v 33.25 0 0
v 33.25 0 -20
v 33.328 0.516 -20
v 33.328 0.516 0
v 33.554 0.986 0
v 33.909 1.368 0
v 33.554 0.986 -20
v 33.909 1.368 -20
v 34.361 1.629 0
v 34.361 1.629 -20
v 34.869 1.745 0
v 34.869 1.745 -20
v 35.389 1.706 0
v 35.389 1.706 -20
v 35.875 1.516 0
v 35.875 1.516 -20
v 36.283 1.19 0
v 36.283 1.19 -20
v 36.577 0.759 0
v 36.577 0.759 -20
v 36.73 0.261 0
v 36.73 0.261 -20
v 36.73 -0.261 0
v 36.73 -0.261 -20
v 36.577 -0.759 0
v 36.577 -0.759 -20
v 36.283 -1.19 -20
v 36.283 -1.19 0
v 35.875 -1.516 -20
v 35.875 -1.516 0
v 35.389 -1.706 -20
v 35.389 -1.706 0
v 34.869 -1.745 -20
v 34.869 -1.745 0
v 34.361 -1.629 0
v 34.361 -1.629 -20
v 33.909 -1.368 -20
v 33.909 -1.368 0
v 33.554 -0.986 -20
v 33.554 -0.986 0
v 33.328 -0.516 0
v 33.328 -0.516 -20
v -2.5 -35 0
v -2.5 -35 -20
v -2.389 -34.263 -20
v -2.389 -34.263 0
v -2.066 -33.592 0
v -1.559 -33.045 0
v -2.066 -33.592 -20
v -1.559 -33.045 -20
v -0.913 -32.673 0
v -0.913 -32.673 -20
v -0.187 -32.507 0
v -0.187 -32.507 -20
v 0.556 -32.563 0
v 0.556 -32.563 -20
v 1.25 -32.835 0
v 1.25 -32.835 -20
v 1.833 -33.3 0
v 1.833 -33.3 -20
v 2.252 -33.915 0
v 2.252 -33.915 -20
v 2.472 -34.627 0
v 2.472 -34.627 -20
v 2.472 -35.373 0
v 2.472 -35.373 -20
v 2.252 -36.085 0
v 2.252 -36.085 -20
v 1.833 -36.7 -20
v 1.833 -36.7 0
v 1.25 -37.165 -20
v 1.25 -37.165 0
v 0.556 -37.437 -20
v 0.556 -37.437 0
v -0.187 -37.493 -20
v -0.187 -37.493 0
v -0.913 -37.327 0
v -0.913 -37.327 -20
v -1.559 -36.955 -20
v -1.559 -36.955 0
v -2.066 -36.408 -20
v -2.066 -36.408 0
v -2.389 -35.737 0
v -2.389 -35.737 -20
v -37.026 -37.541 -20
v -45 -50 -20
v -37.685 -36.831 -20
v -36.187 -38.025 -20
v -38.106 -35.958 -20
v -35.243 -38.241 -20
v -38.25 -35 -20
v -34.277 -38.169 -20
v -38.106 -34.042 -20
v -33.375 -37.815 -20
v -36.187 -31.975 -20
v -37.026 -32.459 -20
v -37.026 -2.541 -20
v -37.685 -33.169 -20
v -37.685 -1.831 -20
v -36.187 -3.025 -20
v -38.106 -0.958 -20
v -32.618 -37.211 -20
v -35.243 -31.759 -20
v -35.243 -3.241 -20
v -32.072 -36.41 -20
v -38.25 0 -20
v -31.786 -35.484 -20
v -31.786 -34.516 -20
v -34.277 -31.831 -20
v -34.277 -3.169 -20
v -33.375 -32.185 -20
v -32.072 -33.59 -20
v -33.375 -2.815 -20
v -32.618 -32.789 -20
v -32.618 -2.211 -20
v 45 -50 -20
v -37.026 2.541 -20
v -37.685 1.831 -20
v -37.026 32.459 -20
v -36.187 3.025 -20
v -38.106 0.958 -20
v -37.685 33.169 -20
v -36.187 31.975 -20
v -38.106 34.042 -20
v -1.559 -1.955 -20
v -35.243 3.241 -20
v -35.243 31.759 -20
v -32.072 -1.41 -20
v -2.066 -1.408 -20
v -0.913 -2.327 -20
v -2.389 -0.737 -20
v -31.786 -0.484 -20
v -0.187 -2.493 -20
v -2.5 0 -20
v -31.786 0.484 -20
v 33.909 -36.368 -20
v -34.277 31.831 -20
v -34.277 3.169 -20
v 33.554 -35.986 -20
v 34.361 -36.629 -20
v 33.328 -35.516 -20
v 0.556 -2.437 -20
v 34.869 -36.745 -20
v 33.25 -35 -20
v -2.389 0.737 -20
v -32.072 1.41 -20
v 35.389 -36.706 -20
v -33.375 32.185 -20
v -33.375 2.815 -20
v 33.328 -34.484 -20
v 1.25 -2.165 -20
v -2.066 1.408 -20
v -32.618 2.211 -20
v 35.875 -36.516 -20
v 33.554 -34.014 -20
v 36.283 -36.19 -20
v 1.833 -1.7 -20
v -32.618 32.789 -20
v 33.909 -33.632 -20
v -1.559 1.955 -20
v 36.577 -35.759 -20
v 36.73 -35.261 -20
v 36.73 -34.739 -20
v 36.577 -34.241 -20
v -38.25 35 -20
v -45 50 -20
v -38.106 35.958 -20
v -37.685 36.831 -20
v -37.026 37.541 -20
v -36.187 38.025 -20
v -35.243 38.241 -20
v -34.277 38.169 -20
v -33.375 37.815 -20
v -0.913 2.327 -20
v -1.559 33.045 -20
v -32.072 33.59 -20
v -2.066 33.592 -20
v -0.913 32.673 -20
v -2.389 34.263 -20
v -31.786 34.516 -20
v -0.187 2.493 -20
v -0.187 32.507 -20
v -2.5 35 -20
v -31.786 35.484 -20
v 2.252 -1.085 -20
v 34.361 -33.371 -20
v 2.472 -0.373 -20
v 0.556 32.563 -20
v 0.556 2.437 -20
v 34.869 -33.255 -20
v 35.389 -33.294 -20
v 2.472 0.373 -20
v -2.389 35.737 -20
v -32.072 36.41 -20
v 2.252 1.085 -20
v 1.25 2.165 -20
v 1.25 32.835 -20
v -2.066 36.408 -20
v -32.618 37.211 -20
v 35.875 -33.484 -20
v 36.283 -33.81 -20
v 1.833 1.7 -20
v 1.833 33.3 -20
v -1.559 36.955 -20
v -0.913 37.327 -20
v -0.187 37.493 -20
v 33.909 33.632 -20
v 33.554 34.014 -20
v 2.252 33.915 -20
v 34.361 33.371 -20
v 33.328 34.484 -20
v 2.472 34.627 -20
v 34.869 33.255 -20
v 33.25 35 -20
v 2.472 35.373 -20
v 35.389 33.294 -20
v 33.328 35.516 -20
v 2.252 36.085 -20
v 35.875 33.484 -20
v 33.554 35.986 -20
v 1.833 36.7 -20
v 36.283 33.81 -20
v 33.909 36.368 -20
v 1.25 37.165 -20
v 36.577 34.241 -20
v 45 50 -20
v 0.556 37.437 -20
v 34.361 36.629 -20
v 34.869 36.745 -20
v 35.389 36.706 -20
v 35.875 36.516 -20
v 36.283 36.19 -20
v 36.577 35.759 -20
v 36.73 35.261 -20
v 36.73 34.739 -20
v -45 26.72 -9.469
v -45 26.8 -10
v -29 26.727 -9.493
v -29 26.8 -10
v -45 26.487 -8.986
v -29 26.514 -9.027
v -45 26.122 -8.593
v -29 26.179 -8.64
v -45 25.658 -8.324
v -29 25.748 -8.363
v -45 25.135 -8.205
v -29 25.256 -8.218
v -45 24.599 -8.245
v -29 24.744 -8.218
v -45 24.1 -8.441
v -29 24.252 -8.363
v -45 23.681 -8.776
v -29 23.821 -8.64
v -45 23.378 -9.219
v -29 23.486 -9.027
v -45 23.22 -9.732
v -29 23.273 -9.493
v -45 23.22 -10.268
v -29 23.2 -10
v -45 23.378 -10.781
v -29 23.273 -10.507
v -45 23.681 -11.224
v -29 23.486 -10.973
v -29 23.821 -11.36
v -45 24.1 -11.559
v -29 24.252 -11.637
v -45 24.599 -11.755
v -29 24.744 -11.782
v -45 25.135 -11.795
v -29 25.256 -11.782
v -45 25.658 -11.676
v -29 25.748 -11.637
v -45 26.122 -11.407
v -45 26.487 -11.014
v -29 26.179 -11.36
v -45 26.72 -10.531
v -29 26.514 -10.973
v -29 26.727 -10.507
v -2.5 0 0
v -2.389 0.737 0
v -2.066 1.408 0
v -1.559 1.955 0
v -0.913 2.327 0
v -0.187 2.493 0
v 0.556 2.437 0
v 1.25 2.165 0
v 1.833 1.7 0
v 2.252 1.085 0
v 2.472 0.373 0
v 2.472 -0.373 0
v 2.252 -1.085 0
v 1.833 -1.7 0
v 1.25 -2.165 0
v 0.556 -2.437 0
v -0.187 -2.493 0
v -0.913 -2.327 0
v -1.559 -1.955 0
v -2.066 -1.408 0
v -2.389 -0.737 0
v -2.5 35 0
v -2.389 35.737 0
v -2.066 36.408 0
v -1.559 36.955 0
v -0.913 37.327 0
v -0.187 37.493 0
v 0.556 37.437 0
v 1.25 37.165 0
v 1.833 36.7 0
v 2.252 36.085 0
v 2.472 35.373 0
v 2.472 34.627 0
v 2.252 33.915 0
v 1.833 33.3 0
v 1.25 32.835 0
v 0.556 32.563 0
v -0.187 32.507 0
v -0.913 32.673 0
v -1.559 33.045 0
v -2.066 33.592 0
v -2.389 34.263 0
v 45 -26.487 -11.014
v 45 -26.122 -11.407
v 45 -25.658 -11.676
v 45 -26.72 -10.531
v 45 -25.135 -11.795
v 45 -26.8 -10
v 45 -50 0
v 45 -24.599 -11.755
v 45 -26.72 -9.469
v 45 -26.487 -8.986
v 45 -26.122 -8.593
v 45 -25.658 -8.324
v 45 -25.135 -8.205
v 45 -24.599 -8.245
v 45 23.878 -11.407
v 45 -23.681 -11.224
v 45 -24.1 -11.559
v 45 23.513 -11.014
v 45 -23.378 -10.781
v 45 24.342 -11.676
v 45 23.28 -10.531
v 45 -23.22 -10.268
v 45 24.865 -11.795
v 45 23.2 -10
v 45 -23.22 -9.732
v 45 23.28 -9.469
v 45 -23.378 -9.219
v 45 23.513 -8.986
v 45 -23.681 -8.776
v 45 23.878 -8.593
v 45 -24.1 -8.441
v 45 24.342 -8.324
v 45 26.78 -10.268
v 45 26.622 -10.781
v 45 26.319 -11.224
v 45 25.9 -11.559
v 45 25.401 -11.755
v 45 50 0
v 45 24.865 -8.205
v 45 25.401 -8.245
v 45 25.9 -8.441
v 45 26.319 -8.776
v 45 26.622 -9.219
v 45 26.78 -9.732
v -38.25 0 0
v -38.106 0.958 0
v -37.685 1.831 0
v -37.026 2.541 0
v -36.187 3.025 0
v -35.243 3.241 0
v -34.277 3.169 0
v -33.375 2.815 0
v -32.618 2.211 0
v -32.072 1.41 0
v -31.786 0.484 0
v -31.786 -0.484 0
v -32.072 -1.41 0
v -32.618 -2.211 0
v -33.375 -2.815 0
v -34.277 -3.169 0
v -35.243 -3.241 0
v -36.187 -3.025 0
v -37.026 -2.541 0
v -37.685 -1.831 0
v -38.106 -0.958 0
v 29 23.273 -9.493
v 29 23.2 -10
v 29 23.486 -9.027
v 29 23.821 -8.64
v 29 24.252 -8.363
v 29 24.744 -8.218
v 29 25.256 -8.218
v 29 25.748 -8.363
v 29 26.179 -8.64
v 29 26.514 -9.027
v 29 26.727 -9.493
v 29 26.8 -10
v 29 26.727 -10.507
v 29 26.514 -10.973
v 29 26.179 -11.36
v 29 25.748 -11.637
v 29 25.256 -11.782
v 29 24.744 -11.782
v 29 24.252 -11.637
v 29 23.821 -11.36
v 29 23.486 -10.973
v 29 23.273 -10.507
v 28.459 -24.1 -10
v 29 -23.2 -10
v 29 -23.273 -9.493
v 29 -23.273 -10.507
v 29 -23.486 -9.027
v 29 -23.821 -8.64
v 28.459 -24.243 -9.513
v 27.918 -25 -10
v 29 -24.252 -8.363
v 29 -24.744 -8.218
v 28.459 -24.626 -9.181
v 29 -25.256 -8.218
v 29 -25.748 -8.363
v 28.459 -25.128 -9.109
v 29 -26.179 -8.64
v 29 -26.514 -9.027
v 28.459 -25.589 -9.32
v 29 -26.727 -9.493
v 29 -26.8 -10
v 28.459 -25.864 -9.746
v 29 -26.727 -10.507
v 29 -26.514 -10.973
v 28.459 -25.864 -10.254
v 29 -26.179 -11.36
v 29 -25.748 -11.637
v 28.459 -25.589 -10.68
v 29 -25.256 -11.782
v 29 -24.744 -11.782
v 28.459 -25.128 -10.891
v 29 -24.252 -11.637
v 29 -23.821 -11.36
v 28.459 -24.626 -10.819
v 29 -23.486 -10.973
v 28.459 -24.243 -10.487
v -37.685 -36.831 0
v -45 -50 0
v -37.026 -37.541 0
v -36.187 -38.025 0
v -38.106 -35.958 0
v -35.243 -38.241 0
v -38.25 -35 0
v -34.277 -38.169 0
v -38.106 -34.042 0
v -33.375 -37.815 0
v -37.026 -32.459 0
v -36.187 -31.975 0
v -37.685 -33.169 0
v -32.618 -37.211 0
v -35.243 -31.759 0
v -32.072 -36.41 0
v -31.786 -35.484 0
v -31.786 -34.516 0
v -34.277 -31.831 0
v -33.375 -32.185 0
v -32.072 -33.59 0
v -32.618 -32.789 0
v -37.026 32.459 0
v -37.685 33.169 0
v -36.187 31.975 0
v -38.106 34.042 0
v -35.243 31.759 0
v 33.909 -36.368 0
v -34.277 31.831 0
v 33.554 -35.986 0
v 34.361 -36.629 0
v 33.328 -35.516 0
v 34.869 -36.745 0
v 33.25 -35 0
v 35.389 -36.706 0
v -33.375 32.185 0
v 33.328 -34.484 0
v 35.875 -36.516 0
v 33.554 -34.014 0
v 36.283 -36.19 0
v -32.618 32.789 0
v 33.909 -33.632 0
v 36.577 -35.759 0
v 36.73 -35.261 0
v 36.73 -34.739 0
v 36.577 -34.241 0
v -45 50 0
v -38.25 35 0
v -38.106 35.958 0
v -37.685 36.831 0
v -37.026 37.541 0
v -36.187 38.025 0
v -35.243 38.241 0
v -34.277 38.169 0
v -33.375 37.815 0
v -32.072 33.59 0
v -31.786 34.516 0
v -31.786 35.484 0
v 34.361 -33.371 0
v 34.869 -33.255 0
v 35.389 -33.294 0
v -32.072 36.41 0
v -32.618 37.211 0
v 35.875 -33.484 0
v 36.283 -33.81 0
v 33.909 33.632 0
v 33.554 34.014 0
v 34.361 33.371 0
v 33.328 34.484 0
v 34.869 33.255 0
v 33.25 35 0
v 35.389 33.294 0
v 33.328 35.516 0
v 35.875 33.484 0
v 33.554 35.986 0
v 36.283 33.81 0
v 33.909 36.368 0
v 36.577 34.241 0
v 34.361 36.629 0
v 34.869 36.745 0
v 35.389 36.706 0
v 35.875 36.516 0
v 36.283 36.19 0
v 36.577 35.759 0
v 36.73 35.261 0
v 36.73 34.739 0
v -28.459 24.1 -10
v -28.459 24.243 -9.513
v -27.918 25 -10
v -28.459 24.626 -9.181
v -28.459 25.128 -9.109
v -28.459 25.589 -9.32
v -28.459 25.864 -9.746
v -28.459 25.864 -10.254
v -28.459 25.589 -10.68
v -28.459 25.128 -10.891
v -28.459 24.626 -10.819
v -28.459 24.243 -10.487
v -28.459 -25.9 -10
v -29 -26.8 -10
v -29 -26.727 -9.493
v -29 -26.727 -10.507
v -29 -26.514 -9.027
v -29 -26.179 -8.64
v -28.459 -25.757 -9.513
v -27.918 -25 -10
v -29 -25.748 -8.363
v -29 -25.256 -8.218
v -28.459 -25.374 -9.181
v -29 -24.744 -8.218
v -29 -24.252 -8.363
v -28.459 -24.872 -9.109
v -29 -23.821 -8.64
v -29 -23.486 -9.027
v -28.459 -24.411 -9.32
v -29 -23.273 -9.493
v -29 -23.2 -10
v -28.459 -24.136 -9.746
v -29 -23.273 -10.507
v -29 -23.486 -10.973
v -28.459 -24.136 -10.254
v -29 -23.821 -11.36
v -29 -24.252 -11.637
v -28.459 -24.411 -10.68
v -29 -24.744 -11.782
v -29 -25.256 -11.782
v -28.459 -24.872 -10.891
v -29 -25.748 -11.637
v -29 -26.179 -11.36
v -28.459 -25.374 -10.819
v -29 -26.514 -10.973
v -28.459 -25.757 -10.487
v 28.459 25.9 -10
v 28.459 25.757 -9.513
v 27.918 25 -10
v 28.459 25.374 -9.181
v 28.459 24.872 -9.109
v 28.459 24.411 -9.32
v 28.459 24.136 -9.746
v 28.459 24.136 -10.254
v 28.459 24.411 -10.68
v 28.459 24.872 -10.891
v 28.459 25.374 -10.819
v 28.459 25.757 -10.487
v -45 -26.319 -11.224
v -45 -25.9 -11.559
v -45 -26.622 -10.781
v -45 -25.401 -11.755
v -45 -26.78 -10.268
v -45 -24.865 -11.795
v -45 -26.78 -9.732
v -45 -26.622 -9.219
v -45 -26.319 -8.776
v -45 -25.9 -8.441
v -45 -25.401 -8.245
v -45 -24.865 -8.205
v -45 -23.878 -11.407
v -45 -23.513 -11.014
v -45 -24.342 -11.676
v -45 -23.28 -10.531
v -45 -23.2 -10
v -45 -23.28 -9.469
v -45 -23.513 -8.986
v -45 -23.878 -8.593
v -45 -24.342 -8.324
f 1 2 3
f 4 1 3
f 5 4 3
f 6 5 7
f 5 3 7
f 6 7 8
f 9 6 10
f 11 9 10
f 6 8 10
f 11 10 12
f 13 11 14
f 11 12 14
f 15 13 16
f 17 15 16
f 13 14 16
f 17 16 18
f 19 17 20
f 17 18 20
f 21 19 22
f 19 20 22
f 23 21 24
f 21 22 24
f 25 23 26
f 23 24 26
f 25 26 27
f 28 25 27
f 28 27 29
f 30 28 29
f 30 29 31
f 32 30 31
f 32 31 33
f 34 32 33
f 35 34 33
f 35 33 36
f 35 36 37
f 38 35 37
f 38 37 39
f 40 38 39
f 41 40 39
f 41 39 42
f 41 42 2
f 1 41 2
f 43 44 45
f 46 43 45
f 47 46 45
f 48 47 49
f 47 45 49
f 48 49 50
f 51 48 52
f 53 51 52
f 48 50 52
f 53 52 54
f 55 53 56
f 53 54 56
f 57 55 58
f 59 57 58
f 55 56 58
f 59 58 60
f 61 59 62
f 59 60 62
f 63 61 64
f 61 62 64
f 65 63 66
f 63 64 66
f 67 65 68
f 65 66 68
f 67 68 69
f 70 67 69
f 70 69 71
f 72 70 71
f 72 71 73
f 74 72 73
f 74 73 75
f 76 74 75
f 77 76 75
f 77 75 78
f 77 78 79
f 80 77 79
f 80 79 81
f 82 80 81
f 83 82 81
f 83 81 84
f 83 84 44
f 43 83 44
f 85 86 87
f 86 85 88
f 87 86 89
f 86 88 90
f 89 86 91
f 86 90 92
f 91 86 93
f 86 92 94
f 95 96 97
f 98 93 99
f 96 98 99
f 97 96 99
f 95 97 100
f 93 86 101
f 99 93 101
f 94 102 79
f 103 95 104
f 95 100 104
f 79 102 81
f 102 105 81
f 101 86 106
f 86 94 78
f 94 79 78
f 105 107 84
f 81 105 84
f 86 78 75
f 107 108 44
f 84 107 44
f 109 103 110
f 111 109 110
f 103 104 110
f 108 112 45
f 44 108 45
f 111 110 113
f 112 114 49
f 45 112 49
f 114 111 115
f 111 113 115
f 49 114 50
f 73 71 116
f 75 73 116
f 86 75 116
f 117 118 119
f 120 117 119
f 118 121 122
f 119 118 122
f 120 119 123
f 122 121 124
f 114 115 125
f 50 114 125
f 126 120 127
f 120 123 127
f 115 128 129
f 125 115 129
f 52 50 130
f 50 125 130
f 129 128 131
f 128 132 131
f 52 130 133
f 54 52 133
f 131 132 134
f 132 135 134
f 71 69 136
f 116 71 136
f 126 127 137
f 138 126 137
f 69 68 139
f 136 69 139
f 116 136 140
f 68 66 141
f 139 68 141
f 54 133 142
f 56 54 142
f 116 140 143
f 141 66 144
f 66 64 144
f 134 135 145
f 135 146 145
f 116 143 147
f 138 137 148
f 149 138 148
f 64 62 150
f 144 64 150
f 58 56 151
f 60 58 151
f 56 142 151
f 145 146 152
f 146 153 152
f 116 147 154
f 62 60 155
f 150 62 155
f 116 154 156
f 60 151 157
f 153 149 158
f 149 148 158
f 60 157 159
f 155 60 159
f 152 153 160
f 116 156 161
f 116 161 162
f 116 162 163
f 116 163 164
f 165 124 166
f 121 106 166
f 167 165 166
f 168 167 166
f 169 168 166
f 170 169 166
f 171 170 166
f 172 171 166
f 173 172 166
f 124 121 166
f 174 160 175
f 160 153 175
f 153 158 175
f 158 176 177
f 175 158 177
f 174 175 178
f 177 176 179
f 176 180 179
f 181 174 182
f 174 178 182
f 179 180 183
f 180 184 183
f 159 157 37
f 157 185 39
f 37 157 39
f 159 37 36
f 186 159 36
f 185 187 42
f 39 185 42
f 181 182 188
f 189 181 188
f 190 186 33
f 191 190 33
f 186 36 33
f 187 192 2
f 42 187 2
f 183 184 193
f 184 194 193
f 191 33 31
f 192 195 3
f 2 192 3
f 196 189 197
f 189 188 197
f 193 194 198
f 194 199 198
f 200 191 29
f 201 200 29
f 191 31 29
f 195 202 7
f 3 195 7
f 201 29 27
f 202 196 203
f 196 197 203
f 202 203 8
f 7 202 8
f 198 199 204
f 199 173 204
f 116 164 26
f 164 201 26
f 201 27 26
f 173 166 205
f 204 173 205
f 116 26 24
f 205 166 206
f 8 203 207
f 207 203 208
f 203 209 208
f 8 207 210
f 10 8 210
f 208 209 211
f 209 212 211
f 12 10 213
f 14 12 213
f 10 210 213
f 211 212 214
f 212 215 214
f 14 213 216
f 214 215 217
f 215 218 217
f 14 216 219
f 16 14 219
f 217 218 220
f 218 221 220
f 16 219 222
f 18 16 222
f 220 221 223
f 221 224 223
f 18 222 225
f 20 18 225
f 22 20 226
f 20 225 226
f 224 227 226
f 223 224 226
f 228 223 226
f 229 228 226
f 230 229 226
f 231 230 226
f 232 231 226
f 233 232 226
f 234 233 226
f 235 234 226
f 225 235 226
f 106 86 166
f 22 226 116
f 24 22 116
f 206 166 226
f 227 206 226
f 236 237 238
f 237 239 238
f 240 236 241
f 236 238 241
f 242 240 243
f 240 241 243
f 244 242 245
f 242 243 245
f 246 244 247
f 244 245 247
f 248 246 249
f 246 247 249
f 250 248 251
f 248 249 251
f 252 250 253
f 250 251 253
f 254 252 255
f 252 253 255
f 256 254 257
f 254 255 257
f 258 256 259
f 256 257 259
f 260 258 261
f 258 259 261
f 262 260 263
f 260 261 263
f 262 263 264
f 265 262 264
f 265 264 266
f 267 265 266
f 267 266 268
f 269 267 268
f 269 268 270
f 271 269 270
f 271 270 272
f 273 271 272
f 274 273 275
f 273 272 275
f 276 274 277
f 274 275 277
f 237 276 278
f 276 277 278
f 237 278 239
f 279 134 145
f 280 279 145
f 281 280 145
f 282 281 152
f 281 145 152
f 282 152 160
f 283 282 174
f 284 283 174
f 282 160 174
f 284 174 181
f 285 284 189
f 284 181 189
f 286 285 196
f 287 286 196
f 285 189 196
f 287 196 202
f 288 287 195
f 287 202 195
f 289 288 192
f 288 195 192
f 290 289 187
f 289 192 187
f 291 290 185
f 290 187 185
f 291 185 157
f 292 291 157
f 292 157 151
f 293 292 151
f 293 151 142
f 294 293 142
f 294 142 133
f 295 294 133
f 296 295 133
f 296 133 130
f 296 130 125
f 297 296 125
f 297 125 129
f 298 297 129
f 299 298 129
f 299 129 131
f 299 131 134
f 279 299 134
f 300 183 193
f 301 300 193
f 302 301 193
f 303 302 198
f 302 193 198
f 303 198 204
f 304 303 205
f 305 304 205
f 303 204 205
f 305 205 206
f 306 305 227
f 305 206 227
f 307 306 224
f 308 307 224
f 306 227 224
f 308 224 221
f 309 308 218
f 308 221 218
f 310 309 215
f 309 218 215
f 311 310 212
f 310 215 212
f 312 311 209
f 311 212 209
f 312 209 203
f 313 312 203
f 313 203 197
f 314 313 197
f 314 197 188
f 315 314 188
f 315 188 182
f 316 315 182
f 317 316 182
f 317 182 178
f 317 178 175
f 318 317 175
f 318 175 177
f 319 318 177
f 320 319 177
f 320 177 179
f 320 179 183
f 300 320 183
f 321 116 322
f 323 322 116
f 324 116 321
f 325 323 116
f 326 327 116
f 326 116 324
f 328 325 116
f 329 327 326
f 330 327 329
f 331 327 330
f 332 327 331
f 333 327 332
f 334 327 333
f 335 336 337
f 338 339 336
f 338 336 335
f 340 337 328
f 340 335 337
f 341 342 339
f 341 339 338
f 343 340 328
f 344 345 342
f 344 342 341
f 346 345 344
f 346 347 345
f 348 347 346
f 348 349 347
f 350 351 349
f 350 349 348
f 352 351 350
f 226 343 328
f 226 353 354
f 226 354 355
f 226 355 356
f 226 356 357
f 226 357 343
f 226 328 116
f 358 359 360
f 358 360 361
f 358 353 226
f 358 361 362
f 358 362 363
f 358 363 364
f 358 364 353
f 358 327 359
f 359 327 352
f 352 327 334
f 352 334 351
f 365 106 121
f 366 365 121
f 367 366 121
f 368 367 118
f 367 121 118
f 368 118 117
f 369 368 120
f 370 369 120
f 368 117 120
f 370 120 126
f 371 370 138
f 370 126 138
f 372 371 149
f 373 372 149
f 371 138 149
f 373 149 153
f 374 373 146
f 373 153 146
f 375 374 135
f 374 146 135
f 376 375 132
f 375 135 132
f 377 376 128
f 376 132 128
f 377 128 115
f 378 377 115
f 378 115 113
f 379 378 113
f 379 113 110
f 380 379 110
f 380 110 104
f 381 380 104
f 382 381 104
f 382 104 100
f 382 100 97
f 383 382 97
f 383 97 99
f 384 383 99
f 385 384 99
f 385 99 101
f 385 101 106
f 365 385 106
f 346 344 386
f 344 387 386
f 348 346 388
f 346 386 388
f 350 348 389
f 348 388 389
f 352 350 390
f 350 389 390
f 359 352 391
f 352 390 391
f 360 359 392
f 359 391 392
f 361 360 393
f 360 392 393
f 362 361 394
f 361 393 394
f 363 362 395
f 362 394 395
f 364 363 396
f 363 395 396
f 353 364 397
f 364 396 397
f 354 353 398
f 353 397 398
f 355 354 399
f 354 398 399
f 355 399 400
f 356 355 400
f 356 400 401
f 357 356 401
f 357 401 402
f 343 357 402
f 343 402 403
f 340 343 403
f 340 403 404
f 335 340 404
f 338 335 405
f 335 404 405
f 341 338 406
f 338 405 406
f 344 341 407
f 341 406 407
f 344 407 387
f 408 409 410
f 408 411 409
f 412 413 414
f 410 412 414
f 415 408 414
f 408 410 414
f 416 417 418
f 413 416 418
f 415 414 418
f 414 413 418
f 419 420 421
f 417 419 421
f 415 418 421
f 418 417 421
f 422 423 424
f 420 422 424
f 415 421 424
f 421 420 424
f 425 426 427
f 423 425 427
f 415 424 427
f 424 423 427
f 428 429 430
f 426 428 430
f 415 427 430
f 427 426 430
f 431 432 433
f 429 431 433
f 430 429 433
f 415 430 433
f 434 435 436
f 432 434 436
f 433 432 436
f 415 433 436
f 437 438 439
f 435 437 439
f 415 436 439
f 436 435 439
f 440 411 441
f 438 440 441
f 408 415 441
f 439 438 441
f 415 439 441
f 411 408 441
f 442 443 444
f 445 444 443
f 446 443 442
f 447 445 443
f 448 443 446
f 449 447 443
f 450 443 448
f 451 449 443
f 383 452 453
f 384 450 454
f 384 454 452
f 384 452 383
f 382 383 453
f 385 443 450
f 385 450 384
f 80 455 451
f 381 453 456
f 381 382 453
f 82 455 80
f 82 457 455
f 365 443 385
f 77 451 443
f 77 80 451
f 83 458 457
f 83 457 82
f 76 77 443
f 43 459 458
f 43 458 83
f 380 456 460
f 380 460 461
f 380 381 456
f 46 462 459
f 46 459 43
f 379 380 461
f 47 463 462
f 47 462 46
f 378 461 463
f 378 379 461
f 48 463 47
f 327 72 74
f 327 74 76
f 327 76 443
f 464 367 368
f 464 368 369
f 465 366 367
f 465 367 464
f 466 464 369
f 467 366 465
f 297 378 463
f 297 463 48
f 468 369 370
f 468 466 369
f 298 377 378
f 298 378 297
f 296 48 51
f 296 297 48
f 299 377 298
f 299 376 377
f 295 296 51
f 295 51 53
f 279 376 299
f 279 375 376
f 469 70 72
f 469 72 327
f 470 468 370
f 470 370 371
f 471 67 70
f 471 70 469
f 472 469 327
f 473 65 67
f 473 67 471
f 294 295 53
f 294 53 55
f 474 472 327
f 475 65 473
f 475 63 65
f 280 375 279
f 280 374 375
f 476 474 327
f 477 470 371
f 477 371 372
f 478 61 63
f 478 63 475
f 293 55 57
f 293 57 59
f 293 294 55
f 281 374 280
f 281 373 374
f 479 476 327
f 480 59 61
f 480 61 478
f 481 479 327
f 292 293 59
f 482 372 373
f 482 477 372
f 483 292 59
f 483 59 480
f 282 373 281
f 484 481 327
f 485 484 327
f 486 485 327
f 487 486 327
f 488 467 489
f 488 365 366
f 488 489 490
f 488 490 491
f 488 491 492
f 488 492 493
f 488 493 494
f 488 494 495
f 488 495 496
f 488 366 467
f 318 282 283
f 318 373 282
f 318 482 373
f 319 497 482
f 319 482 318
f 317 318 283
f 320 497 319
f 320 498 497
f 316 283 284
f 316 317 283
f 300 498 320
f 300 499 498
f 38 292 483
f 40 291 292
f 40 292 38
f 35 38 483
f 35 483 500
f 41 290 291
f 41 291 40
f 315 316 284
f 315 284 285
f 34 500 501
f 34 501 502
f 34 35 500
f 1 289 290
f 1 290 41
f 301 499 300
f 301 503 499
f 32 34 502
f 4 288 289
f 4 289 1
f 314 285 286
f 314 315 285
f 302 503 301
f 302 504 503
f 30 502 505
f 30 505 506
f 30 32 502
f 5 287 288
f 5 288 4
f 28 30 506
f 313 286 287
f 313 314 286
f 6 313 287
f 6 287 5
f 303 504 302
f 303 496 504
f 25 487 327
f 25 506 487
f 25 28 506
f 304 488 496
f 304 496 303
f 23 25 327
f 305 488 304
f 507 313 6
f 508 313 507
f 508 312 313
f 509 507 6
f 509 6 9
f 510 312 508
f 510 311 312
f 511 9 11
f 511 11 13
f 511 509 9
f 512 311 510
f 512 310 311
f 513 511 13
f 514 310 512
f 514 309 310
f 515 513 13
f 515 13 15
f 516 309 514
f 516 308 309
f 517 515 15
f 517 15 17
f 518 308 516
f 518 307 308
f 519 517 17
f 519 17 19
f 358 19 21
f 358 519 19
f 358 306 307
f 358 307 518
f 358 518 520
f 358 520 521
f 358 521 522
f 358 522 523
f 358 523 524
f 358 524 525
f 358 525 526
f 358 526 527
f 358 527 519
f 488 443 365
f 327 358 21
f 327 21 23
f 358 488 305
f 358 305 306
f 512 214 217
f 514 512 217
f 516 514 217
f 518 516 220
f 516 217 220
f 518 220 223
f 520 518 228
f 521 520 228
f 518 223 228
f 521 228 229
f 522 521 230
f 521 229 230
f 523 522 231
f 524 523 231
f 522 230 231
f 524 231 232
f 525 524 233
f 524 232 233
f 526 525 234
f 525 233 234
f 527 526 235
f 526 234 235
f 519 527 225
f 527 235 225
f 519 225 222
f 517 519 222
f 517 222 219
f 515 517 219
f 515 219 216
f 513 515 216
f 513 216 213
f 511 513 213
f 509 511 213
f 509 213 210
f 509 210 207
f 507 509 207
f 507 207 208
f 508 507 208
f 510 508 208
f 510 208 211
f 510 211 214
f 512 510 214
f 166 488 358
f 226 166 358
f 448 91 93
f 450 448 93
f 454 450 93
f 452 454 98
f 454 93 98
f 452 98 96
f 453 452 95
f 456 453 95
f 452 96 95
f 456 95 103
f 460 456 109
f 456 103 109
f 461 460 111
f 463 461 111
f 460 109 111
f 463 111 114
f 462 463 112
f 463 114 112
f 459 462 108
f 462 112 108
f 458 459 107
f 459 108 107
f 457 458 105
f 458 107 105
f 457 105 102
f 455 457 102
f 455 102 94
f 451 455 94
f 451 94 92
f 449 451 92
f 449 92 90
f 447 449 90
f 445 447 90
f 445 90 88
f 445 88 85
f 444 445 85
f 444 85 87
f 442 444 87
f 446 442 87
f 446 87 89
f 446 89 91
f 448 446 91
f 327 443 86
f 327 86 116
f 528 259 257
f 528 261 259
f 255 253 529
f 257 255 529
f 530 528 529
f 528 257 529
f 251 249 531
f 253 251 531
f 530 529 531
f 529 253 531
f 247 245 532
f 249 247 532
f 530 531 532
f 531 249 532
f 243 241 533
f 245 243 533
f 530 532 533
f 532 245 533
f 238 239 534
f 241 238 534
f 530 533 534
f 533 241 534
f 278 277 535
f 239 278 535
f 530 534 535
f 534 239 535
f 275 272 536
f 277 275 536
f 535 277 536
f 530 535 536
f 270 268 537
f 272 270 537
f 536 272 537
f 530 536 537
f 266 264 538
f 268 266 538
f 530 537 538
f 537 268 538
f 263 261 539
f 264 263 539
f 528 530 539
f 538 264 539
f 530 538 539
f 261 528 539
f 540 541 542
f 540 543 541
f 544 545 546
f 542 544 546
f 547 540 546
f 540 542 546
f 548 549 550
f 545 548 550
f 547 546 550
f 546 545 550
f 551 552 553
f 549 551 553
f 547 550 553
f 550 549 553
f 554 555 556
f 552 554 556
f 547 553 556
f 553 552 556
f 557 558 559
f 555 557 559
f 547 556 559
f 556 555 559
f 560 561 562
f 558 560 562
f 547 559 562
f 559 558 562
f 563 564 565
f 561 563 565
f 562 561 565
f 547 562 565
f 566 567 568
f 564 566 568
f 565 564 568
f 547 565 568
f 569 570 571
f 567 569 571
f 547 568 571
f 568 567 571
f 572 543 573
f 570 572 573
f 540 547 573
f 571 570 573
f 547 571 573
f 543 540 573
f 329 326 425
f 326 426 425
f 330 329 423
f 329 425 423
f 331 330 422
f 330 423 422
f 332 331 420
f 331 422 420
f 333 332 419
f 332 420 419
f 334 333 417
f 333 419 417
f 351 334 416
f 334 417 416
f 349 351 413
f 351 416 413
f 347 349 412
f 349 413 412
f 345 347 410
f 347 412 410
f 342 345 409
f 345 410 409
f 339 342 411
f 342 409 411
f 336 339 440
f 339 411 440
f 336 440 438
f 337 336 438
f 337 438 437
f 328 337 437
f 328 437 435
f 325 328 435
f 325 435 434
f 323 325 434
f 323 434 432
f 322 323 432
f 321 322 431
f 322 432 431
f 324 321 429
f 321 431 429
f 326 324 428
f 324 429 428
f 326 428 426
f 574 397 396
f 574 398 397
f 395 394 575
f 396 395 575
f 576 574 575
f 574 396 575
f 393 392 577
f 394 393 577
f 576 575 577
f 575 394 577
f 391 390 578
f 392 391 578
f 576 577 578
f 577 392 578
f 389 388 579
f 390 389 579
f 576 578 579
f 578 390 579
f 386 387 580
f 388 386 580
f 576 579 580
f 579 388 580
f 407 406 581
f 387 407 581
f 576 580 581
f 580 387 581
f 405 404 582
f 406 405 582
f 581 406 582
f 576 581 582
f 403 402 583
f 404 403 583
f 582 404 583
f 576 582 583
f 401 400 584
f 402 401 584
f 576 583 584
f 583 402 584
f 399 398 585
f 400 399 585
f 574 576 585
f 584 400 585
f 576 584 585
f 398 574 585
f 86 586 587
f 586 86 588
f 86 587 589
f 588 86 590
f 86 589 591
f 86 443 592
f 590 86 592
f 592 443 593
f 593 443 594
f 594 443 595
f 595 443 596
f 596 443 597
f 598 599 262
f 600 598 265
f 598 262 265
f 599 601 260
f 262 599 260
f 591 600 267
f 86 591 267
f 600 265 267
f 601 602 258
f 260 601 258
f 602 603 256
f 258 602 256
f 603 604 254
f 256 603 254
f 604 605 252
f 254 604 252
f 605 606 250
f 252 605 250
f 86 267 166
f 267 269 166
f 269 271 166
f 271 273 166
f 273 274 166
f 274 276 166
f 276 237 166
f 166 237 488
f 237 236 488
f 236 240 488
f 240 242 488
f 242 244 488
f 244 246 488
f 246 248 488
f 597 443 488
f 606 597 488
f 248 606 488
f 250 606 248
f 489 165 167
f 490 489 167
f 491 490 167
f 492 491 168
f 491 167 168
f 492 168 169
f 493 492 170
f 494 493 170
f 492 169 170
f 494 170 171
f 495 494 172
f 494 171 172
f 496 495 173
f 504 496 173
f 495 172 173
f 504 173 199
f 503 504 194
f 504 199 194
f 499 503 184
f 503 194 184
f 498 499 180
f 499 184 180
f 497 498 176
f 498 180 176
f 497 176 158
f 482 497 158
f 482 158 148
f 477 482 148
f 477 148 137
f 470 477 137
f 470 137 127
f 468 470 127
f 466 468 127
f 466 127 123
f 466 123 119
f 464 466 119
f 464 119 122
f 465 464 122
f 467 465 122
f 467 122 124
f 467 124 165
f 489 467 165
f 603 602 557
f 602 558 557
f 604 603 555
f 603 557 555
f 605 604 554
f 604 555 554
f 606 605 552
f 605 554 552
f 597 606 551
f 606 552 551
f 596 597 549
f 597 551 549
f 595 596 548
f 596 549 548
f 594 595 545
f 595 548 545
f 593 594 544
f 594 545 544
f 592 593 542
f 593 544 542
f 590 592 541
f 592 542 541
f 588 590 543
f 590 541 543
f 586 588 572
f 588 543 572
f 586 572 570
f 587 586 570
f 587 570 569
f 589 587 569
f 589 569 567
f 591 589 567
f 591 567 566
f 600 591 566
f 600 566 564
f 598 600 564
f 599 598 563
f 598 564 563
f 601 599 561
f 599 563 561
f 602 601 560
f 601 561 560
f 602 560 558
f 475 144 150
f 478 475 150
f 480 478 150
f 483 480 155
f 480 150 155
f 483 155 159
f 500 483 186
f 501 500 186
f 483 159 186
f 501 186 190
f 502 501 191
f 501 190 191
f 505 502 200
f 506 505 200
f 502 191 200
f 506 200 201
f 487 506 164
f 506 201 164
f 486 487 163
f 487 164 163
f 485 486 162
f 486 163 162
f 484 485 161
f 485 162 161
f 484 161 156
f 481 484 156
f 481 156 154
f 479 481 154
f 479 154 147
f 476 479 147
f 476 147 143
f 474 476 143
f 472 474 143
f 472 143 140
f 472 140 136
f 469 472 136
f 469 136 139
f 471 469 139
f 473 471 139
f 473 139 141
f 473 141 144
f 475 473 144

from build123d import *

# Parameters (mm, degrees)
F0_W     = 90
F0_H     = 100
F1_DEPTH = 20
F2_D     = 6.5
F3_D     = 5
F4_D     = 3.5
F6_D     = 3.6
F6_DEPTH = 16
F6_TIP   = 1.0815491142
F8_D     = 3.6
F8_DEPTH = 16
F8_TIP   = 1.0815491142


with BuildPart() as f1:
    # F0 (on Top) → F1 (new body)
    with BuildSketch(Plane.XY):
        Rectangle(F0_W, F0_H)
    extrude(amount=-F1_DEPTH)

    # F2 (through all)
    with Locations(Plane.XY):
        with Locations((-35, 35), (-35, 0), (-35, -35)):
            Hole(F2_D / 2)

    # F3 (through all)
    with Locations(Plane.XY):
        with Locations((0, 35), (0, 0), (0, -35)):
            Hole(F3_D / 2)

    # F4 (through all)
    with Locations(Plane.XY):
        with Locations((35, 35), (35, 0), (35, -35)):
            Hole(F4_D / 2)

    # F6
    with Locations(Plane(origin=(-45, 0, 0), x_dir=(0, -1, 0), z_dir=(-1, 0, 0))):
        with Locations((-25, -10), (25, -10)):
            Hole(F6_D / 2, depth=F6_DEPTH)
            with Locations((0, 0, -(F6_DEPTH + F6_TIP / 2))):  # 118° drill point
                Cone(0, F6_D / 2, F6_TIP, mode=Mode.SUBTRACT)

    # F8
    with Locations(Plane.YZ.offset(45)):
        with Locations((-25, -10), (25, -10)):
            Hole(F8_D / 2, depth=F8_DEPTH)
            with Locations((0, 0, -(F8_DEPTH + F8_TIP / 2))):  # 118° drill point
                Cone(0, F8_D / 2, F8_TIP, mode=Mode.SUBTRACT)


solid = f1.part
